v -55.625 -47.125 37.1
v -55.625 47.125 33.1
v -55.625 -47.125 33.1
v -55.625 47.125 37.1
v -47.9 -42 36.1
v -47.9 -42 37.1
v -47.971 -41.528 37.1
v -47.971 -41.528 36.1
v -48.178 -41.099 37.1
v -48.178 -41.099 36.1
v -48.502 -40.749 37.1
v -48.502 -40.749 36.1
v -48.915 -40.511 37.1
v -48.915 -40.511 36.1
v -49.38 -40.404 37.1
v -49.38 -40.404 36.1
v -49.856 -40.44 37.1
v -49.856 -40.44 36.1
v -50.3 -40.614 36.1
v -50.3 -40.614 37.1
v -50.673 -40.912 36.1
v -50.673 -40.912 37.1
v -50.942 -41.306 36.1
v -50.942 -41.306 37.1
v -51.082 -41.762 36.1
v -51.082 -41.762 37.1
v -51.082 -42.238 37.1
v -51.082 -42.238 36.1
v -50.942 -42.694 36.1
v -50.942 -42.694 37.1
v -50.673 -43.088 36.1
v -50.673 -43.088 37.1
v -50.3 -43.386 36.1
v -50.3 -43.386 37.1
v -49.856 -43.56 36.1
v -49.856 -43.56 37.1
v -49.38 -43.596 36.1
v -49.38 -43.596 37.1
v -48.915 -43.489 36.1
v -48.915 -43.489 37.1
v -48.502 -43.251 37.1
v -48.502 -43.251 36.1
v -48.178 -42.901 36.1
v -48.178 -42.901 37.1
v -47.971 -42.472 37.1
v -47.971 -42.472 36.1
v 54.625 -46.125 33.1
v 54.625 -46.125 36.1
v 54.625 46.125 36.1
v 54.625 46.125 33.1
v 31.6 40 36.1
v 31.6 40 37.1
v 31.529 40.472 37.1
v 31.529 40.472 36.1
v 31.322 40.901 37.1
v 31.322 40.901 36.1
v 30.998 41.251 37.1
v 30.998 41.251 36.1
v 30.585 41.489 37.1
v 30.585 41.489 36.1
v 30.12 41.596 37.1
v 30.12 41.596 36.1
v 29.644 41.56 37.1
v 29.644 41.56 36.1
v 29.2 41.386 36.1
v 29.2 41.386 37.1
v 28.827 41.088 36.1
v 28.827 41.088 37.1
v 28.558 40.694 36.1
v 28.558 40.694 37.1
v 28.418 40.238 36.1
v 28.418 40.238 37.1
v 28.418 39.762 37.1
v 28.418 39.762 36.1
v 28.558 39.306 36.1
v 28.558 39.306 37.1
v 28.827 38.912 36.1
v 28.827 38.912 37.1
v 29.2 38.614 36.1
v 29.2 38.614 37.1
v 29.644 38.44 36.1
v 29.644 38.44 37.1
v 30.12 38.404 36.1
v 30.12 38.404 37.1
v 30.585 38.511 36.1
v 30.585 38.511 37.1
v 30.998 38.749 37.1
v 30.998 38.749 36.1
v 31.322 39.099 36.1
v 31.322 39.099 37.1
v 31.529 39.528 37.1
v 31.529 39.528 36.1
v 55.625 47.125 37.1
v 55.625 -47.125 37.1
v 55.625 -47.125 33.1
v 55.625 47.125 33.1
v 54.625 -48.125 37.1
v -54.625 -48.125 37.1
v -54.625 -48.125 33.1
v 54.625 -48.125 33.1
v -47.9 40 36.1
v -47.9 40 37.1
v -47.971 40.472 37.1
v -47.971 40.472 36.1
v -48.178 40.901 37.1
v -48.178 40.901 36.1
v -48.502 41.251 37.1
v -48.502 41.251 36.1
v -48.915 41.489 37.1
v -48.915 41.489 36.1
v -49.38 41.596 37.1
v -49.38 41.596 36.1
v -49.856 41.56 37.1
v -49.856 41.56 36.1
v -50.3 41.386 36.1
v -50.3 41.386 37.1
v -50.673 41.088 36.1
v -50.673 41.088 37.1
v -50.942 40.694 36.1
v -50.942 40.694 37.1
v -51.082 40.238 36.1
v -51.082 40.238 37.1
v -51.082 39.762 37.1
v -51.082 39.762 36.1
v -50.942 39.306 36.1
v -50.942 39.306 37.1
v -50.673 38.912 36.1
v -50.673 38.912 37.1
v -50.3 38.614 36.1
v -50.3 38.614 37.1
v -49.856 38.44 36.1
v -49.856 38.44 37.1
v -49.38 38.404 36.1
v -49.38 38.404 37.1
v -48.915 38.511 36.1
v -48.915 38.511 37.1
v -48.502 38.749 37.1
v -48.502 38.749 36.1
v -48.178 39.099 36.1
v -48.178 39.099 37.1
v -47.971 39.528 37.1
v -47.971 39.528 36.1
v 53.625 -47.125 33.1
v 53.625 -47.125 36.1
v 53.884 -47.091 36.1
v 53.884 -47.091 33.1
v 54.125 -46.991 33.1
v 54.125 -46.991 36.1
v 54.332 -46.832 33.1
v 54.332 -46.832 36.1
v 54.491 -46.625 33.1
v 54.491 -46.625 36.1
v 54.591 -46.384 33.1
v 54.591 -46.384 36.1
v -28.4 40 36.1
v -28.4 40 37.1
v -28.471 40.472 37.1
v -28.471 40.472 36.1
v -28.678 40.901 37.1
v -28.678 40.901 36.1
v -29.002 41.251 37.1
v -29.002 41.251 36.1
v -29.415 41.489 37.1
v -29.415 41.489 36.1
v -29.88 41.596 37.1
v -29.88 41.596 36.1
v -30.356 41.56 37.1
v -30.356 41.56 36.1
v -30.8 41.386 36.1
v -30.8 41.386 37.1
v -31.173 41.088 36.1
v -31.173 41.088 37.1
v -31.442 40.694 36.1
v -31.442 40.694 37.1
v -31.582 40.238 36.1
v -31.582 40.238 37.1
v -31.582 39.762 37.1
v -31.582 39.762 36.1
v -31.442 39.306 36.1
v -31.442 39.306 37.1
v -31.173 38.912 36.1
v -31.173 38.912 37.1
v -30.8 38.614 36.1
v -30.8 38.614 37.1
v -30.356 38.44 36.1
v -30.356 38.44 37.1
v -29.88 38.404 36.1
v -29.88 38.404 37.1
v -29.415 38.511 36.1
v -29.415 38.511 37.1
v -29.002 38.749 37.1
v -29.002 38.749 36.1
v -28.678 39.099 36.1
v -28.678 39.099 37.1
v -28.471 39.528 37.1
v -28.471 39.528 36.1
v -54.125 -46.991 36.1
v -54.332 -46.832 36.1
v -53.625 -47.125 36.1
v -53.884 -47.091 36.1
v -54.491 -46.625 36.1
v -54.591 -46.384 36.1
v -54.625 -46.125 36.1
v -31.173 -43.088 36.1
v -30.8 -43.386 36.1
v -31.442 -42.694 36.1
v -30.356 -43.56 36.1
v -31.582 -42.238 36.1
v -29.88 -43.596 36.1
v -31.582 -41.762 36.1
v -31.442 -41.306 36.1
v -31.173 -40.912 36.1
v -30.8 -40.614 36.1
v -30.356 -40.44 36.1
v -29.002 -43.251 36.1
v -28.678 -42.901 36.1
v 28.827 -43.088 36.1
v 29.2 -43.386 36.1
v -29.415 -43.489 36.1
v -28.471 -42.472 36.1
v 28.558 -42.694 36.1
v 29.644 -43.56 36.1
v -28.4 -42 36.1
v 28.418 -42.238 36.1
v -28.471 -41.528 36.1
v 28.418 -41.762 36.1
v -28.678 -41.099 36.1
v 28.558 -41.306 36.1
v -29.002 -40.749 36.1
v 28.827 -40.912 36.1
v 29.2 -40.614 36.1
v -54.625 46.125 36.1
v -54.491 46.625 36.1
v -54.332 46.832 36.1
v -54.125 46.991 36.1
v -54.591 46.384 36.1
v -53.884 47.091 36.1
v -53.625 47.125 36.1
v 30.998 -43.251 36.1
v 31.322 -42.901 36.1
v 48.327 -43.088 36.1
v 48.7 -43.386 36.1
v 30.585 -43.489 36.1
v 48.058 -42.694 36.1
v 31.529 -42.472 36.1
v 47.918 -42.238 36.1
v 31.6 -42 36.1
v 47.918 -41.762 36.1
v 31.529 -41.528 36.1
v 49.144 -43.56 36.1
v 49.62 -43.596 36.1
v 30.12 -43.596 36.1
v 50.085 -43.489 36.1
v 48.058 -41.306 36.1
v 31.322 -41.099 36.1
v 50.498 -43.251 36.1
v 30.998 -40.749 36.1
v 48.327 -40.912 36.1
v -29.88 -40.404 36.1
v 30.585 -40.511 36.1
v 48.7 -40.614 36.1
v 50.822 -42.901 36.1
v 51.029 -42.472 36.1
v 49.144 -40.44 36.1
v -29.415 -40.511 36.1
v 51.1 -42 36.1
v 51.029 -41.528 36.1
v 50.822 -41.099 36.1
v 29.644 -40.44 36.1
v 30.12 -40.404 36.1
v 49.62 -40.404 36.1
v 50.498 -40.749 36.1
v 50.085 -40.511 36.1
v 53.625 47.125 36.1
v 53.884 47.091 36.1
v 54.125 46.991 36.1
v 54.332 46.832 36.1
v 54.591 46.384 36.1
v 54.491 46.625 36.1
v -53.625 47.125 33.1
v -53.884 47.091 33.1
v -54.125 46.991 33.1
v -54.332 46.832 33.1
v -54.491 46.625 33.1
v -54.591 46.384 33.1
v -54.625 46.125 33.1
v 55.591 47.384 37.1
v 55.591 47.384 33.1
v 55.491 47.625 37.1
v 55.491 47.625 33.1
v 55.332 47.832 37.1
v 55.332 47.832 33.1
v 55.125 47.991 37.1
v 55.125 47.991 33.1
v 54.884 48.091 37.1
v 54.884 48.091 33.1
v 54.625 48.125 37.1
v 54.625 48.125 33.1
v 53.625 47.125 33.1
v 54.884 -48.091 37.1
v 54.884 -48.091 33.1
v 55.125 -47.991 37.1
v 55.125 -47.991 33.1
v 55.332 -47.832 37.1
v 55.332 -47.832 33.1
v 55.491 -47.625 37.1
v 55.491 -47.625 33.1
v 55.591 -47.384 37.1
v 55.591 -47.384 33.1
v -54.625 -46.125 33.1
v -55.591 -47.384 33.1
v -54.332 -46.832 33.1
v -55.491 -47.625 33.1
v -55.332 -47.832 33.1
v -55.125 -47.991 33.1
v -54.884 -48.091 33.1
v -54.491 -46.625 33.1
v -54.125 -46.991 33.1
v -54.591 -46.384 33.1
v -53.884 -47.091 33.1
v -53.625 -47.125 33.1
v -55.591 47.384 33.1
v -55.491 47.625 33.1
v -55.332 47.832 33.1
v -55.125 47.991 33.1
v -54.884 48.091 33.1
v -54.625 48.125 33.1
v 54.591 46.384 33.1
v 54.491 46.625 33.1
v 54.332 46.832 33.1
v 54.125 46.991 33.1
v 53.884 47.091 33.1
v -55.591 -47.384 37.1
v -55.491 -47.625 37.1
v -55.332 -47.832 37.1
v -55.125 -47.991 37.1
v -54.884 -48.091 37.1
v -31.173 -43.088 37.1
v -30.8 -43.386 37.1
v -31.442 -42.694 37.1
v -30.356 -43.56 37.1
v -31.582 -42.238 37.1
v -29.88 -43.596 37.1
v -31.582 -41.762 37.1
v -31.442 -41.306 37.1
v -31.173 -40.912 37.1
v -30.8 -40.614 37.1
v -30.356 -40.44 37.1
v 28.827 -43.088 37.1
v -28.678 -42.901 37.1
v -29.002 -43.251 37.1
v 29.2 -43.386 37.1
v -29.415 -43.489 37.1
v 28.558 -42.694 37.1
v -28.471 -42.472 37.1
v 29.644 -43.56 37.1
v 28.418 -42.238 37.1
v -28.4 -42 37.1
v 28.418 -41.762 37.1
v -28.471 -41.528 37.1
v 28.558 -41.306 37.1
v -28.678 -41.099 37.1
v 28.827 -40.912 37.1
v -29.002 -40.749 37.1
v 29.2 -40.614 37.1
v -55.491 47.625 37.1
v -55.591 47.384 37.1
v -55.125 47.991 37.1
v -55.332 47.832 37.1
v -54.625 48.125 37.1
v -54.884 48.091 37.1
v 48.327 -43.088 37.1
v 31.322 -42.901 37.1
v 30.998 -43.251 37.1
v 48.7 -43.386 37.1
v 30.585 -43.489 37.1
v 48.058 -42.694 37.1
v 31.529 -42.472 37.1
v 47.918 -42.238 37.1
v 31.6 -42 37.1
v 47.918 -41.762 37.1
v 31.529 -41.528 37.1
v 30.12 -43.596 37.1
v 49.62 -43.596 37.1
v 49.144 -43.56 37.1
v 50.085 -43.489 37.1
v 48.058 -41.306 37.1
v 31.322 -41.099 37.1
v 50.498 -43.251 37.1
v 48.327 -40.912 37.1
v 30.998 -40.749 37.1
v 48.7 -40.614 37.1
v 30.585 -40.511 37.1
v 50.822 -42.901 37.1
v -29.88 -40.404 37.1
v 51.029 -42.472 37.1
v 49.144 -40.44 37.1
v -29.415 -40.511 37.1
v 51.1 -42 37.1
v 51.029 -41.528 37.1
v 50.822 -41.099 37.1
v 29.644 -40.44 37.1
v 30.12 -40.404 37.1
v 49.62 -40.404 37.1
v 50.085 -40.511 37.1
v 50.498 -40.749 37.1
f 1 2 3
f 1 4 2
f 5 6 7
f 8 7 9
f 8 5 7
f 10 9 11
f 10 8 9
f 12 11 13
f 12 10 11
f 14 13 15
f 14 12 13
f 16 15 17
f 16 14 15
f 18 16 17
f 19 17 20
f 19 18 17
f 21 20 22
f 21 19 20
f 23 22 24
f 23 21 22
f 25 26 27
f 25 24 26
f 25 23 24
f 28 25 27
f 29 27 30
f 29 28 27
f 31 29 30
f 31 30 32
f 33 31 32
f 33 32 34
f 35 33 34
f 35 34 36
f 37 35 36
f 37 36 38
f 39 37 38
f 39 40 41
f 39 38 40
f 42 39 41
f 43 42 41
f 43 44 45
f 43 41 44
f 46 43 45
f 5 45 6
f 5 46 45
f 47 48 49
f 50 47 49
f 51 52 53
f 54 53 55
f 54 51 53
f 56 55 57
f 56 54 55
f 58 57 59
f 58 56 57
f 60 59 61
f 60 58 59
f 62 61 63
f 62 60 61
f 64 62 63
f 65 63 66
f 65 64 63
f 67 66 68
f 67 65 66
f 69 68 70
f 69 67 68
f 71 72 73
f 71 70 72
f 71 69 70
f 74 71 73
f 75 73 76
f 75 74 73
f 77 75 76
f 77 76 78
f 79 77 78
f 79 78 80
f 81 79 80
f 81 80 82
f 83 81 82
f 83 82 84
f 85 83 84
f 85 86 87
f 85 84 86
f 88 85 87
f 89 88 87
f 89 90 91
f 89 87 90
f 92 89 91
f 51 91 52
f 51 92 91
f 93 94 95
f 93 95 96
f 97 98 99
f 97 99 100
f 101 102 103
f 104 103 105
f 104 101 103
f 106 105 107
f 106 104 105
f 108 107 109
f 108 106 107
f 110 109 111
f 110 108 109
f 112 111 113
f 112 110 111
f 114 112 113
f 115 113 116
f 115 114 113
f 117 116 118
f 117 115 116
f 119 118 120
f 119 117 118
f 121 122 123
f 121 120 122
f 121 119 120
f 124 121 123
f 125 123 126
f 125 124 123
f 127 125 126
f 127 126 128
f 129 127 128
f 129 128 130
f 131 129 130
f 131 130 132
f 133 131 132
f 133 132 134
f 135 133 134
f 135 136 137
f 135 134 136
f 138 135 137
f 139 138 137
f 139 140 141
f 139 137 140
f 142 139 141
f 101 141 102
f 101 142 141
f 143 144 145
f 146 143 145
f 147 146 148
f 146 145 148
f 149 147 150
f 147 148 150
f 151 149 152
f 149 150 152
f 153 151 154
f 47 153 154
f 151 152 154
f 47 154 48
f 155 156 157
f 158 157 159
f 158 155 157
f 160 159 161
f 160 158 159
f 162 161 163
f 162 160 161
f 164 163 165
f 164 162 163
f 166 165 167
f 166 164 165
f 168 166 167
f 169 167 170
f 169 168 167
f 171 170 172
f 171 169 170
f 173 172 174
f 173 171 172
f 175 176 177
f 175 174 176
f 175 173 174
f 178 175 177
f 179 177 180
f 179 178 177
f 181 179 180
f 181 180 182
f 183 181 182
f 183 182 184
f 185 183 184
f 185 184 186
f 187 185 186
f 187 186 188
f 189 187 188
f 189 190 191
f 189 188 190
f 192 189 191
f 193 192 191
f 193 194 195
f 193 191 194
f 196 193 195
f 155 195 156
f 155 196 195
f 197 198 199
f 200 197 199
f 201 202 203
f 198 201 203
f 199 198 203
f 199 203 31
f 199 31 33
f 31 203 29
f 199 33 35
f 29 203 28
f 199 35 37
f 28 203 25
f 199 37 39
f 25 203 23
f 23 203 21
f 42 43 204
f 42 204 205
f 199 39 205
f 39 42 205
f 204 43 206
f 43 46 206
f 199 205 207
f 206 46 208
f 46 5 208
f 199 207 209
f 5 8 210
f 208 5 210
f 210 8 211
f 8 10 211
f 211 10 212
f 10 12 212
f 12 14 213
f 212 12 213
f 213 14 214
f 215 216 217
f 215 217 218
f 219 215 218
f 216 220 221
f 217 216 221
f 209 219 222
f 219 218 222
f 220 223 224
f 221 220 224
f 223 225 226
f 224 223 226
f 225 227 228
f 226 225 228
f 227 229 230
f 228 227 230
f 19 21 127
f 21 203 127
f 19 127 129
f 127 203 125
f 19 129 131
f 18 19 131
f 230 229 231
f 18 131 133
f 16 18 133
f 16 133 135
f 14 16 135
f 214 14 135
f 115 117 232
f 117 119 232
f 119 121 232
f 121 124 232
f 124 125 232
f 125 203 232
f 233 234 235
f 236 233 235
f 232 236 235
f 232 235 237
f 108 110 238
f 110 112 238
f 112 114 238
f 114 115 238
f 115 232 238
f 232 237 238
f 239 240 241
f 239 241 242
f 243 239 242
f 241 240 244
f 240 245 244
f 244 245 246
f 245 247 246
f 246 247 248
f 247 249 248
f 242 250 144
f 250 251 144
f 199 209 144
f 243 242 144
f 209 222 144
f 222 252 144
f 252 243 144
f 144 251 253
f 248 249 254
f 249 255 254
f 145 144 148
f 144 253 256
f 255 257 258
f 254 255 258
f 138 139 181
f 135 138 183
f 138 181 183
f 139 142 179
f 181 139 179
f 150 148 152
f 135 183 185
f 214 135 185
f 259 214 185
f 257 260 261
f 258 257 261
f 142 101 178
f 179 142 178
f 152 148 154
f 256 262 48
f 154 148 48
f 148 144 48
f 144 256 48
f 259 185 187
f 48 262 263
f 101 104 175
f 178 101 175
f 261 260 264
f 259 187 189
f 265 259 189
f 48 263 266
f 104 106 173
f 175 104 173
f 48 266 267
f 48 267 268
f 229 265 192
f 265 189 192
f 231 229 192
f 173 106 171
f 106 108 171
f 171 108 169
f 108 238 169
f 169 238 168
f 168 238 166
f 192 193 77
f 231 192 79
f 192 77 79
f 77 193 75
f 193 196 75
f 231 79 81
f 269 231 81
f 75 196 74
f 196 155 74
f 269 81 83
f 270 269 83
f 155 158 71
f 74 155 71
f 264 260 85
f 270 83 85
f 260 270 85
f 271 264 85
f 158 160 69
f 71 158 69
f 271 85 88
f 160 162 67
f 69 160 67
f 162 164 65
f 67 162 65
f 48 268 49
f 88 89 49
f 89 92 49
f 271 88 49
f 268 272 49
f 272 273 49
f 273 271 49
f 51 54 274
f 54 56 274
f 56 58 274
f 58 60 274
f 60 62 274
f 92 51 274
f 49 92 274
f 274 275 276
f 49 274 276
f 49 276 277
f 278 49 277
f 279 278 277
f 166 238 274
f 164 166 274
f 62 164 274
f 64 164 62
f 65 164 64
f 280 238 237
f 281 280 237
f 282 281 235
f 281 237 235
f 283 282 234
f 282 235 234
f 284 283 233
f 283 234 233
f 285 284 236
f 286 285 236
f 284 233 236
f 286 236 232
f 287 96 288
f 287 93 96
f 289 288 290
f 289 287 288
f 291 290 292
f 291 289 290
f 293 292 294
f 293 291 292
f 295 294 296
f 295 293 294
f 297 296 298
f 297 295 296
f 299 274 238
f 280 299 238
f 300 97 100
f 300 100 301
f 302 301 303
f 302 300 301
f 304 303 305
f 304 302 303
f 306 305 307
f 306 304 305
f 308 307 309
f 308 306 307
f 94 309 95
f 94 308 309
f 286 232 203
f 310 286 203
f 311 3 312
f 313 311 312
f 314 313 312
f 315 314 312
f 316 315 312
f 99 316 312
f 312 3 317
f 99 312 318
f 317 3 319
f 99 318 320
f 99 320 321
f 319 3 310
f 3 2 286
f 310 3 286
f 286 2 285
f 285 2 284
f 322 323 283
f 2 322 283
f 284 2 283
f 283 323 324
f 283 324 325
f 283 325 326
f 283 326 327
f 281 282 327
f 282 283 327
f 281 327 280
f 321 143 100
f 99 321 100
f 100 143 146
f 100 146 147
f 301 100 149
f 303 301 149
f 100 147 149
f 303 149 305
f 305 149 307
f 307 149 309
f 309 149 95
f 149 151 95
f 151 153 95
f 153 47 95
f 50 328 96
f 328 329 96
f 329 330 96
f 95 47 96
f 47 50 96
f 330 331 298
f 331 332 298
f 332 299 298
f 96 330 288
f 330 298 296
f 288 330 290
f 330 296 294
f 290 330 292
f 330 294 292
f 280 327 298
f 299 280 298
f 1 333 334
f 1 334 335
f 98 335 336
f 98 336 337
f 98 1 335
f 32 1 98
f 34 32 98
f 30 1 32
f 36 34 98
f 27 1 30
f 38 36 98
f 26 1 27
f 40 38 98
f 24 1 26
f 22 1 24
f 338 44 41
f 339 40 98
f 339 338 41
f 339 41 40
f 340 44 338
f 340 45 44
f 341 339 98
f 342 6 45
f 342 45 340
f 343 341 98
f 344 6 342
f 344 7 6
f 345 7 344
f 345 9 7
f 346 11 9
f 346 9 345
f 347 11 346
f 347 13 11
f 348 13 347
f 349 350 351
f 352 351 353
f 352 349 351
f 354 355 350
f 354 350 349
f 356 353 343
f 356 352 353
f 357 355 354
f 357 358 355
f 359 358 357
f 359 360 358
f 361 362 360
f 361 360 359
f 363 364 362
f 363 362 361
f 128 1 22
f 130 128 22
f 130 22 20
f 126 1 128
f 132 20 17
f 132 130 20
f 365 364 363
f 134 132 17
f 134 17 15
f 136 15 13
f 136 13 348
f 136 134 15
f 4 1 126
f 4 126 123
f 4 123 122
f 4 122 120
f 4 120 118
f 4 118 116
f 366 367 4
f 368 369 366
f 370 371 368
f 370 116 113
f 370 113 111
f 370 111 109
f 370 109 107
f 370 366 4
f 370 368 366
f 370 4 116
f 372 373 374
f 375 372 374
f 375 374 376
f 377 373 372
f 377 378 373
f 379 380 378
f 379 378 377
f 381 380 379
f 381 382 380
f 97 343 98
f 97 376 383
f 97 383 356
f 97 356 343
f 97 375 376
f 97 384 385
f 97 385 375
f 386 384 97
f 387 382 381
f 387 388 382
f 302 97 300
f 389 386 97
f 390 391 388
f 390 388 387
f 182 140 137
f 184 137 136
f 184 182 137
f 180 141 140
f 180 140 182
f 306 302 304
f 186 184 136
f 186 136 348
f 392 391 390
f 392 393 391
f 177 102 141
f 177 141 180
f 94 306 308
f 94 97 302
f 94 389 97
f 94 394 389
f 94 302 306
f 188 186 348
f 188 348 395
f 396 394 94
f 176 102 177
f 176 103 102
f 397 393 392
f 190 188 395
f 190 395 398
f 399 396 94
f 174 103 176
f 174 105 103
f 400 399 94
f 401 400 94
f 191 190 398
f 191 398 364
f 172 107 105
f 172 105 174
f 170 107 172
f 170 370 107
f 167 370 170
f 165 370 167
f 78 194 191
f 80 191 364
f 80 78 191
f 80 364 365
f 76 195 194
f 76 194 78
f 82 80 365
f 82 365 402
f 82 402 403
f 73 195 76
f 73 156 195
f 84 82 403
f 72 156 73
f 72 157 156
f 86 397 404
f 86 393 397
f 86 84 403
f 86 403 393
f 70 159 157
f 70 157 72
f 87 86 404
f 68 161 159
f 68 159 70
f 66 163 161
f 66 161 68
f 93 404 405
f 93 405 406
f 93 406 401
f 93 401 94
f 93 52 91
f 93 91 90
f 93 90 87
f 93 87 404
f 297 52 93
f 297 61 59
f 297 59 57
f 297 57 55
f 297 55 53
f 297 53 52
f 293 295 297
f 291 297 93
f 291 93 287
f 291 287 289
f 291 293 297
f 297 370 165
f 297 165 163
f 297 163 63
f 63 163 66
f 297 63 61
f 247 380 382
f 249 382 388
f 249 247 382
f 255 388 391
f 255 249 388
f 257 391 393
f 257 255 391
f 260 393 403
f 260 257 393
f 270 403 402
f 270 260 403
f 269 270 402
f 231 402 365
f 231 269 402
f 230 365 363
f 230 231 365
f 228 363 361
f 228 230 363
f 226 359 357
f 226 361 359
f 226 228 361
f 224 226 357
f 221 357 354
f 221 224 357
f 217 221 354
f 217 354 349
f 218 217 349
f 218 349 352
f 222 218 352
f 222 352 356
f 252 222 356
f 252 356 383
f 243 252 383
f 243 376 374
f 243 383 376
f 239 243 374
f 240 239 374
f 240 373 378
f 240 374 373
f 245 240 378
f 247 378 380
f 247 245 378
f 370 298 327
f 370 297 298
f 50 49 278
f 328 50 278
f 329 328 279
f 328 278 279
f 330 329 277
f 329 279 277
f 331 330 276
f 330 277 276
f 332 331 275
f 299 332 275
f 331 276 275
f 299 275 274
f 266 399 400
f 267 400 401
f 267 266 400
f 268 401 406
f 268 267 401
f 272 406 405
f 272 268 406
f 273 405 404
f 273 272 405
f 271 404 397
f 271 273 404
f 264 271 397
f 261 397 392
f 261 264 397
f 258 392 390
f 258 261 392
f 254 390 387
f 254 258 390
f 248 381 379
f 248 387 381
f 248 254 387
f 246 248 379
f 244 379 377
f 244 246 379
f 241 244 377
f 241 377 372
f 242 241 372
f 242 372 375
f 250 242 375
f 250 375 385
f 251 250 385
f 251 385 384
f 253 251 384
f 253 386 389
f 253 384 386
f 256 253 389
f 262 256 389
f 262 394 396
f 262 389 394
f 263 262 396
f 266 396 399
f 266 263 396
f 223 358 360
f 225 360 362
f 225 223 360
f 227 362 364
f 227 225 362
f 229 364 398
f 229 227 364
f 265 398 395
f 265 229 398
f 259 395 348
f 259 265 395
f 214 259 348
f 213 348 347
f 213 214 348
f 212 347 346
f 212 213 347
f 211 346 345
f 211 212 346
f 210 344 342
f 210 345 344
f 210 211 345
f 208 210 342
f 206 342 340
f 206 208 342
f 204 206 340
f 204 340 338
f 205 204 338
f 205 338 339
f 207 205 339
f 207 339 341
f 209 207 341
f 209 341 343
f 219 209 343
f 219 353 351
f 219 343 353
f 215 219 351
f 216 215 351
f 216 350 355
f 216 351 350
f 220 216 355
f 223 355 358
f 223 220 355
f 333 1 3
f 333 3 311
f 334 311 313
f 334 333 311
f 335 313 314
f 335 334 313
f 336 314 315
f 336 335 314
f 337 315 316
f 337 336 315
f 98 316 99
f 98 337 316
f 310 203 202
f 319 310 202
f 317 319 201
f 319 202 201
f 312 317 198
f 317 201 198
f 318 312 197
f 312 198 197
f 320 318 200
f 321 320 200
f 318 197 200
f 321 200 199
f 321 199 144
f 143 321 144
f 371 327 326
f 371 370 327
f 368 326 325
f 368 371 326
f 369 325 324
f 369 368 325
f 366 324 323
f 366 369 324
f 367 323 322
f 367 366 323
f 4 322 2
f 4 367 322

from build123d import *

# Parameters (mm, degrees)
PAD030_DEPTH    = 1
PAD031_DEPTH    = 3
SKETCH049_R     = 1.6
POCKET019_DEPTH = 5


with BuildPart() as part:
    # Sketch047 → Pad030 (new body)
    with BuildSketch(Plane.XY):
        with BuildLine():
            Line((-55.625, 47.125), (-55.625, -47.125))
            ThreePointArc((-55.625, -47.125), (-55.332107, -47.832107), (-54.625, -48.125))
            Line((-54.625, -48.125), (54.625, -48.125))
            ThreePointArc((54.625, -48.125), (55.332107, -47.832107), (55.625, -47.125))
            Line((55.625, -47.125), (55.625, 47.125))
            ThreePointArc((55.625, 47.125), (55.332107, 47.832107), (54.625, 48.125))
            Line((54.625, 48.125), (-54.625, 48.125))
            ThreePointArc((-54.625, 48.125), (-55.332107, 47.832107), (-55.625, 47.125))
        make_face()
    extrude(amount=PAD030_DEPTH)

    # Sketch048 → Pad031 (join)
    with BuildSketch(Plane.XY):
        with BuildLine():
            Line((-55.625, 47.125), (-55.625, -47.125))
            ThreePointArc((-55.625, -47.125), (-55.332107, -47.832107), (-54.625, -48.125))
            Line((-54.625, -48.125), (54.625, -48.125))
            ThreePointArc((54.625, -48.125), (55.332107, -47.832107), (55.625, -47.125))
            Line((55.625, -47.125), (55.625, 47.125))
            ThreePointArc((55.625, 47.125), (55.332107, 47.832107), (54.625, 48.125))
            Line((54.625, 48.125), (-54.625, 48.125))
            ThreePointArc((-54.625, 48.125), (-55.332107, 47.832107), (-55.625, 47.125))
        make_face()
        with BuildLine():
            Line((-54.625, 46.125), (-54.625, -46.125))
            ThreePointArc((-54.625, -46.125), (-54.332107, -46.832107), (-53.625, -47.125))
            Line((-53.625, -47.125), (53.625, -47.125))
            ThreePointArc((53.625, -47.125), (54.332107, -46.832107), (54.625, -46.125))
            Line((54.625, -46.125), (54.625, 46.125))
            ThreePointArc((54.625, 46.125), (54.332107, 46.832107), (53.625, 47.125))
            Line((53.625, 47.125), (-53.625, 47.125))
            ThreePointArc((-53.625, 47.125), (-54.332107, 46.832107), (-54.625, 46.125))
        make_face(mode=Mode.SUBTRACT)
    extrude(amount=-PAD031_DEPTH)

    # Sketch049 → Pocket019 (cut)
    with BuildSketch(Plane.XY):
        with Locations((-49.5, 40)):
            Circle(SKETCH049_R)
        with Locations((-30, 40)):
            Circle(SKETCH049_R)
        with Locations((30, 40)):
            Circle(SKETCH049_R)
        with Locations((-30, -42)):
            Circle(SKETCH049_R)
        with Locations((-49.5, -42)):
            Circle(SKETCH049_R)
        with Locations((30, -42)):
            Circle(SKETCH049_R)
        with Locations((49.5, -42)):
            Circle(SKETCH049_R)
    extrude(amount=POCKET019_DEPTH, mode=Mode.SUBTRACT)


with BuildPart() as part_1:
    # Body013 placement: moved
    add(part.part.moved(Location((0, 0, 36.1))))


solid = part_1.part
